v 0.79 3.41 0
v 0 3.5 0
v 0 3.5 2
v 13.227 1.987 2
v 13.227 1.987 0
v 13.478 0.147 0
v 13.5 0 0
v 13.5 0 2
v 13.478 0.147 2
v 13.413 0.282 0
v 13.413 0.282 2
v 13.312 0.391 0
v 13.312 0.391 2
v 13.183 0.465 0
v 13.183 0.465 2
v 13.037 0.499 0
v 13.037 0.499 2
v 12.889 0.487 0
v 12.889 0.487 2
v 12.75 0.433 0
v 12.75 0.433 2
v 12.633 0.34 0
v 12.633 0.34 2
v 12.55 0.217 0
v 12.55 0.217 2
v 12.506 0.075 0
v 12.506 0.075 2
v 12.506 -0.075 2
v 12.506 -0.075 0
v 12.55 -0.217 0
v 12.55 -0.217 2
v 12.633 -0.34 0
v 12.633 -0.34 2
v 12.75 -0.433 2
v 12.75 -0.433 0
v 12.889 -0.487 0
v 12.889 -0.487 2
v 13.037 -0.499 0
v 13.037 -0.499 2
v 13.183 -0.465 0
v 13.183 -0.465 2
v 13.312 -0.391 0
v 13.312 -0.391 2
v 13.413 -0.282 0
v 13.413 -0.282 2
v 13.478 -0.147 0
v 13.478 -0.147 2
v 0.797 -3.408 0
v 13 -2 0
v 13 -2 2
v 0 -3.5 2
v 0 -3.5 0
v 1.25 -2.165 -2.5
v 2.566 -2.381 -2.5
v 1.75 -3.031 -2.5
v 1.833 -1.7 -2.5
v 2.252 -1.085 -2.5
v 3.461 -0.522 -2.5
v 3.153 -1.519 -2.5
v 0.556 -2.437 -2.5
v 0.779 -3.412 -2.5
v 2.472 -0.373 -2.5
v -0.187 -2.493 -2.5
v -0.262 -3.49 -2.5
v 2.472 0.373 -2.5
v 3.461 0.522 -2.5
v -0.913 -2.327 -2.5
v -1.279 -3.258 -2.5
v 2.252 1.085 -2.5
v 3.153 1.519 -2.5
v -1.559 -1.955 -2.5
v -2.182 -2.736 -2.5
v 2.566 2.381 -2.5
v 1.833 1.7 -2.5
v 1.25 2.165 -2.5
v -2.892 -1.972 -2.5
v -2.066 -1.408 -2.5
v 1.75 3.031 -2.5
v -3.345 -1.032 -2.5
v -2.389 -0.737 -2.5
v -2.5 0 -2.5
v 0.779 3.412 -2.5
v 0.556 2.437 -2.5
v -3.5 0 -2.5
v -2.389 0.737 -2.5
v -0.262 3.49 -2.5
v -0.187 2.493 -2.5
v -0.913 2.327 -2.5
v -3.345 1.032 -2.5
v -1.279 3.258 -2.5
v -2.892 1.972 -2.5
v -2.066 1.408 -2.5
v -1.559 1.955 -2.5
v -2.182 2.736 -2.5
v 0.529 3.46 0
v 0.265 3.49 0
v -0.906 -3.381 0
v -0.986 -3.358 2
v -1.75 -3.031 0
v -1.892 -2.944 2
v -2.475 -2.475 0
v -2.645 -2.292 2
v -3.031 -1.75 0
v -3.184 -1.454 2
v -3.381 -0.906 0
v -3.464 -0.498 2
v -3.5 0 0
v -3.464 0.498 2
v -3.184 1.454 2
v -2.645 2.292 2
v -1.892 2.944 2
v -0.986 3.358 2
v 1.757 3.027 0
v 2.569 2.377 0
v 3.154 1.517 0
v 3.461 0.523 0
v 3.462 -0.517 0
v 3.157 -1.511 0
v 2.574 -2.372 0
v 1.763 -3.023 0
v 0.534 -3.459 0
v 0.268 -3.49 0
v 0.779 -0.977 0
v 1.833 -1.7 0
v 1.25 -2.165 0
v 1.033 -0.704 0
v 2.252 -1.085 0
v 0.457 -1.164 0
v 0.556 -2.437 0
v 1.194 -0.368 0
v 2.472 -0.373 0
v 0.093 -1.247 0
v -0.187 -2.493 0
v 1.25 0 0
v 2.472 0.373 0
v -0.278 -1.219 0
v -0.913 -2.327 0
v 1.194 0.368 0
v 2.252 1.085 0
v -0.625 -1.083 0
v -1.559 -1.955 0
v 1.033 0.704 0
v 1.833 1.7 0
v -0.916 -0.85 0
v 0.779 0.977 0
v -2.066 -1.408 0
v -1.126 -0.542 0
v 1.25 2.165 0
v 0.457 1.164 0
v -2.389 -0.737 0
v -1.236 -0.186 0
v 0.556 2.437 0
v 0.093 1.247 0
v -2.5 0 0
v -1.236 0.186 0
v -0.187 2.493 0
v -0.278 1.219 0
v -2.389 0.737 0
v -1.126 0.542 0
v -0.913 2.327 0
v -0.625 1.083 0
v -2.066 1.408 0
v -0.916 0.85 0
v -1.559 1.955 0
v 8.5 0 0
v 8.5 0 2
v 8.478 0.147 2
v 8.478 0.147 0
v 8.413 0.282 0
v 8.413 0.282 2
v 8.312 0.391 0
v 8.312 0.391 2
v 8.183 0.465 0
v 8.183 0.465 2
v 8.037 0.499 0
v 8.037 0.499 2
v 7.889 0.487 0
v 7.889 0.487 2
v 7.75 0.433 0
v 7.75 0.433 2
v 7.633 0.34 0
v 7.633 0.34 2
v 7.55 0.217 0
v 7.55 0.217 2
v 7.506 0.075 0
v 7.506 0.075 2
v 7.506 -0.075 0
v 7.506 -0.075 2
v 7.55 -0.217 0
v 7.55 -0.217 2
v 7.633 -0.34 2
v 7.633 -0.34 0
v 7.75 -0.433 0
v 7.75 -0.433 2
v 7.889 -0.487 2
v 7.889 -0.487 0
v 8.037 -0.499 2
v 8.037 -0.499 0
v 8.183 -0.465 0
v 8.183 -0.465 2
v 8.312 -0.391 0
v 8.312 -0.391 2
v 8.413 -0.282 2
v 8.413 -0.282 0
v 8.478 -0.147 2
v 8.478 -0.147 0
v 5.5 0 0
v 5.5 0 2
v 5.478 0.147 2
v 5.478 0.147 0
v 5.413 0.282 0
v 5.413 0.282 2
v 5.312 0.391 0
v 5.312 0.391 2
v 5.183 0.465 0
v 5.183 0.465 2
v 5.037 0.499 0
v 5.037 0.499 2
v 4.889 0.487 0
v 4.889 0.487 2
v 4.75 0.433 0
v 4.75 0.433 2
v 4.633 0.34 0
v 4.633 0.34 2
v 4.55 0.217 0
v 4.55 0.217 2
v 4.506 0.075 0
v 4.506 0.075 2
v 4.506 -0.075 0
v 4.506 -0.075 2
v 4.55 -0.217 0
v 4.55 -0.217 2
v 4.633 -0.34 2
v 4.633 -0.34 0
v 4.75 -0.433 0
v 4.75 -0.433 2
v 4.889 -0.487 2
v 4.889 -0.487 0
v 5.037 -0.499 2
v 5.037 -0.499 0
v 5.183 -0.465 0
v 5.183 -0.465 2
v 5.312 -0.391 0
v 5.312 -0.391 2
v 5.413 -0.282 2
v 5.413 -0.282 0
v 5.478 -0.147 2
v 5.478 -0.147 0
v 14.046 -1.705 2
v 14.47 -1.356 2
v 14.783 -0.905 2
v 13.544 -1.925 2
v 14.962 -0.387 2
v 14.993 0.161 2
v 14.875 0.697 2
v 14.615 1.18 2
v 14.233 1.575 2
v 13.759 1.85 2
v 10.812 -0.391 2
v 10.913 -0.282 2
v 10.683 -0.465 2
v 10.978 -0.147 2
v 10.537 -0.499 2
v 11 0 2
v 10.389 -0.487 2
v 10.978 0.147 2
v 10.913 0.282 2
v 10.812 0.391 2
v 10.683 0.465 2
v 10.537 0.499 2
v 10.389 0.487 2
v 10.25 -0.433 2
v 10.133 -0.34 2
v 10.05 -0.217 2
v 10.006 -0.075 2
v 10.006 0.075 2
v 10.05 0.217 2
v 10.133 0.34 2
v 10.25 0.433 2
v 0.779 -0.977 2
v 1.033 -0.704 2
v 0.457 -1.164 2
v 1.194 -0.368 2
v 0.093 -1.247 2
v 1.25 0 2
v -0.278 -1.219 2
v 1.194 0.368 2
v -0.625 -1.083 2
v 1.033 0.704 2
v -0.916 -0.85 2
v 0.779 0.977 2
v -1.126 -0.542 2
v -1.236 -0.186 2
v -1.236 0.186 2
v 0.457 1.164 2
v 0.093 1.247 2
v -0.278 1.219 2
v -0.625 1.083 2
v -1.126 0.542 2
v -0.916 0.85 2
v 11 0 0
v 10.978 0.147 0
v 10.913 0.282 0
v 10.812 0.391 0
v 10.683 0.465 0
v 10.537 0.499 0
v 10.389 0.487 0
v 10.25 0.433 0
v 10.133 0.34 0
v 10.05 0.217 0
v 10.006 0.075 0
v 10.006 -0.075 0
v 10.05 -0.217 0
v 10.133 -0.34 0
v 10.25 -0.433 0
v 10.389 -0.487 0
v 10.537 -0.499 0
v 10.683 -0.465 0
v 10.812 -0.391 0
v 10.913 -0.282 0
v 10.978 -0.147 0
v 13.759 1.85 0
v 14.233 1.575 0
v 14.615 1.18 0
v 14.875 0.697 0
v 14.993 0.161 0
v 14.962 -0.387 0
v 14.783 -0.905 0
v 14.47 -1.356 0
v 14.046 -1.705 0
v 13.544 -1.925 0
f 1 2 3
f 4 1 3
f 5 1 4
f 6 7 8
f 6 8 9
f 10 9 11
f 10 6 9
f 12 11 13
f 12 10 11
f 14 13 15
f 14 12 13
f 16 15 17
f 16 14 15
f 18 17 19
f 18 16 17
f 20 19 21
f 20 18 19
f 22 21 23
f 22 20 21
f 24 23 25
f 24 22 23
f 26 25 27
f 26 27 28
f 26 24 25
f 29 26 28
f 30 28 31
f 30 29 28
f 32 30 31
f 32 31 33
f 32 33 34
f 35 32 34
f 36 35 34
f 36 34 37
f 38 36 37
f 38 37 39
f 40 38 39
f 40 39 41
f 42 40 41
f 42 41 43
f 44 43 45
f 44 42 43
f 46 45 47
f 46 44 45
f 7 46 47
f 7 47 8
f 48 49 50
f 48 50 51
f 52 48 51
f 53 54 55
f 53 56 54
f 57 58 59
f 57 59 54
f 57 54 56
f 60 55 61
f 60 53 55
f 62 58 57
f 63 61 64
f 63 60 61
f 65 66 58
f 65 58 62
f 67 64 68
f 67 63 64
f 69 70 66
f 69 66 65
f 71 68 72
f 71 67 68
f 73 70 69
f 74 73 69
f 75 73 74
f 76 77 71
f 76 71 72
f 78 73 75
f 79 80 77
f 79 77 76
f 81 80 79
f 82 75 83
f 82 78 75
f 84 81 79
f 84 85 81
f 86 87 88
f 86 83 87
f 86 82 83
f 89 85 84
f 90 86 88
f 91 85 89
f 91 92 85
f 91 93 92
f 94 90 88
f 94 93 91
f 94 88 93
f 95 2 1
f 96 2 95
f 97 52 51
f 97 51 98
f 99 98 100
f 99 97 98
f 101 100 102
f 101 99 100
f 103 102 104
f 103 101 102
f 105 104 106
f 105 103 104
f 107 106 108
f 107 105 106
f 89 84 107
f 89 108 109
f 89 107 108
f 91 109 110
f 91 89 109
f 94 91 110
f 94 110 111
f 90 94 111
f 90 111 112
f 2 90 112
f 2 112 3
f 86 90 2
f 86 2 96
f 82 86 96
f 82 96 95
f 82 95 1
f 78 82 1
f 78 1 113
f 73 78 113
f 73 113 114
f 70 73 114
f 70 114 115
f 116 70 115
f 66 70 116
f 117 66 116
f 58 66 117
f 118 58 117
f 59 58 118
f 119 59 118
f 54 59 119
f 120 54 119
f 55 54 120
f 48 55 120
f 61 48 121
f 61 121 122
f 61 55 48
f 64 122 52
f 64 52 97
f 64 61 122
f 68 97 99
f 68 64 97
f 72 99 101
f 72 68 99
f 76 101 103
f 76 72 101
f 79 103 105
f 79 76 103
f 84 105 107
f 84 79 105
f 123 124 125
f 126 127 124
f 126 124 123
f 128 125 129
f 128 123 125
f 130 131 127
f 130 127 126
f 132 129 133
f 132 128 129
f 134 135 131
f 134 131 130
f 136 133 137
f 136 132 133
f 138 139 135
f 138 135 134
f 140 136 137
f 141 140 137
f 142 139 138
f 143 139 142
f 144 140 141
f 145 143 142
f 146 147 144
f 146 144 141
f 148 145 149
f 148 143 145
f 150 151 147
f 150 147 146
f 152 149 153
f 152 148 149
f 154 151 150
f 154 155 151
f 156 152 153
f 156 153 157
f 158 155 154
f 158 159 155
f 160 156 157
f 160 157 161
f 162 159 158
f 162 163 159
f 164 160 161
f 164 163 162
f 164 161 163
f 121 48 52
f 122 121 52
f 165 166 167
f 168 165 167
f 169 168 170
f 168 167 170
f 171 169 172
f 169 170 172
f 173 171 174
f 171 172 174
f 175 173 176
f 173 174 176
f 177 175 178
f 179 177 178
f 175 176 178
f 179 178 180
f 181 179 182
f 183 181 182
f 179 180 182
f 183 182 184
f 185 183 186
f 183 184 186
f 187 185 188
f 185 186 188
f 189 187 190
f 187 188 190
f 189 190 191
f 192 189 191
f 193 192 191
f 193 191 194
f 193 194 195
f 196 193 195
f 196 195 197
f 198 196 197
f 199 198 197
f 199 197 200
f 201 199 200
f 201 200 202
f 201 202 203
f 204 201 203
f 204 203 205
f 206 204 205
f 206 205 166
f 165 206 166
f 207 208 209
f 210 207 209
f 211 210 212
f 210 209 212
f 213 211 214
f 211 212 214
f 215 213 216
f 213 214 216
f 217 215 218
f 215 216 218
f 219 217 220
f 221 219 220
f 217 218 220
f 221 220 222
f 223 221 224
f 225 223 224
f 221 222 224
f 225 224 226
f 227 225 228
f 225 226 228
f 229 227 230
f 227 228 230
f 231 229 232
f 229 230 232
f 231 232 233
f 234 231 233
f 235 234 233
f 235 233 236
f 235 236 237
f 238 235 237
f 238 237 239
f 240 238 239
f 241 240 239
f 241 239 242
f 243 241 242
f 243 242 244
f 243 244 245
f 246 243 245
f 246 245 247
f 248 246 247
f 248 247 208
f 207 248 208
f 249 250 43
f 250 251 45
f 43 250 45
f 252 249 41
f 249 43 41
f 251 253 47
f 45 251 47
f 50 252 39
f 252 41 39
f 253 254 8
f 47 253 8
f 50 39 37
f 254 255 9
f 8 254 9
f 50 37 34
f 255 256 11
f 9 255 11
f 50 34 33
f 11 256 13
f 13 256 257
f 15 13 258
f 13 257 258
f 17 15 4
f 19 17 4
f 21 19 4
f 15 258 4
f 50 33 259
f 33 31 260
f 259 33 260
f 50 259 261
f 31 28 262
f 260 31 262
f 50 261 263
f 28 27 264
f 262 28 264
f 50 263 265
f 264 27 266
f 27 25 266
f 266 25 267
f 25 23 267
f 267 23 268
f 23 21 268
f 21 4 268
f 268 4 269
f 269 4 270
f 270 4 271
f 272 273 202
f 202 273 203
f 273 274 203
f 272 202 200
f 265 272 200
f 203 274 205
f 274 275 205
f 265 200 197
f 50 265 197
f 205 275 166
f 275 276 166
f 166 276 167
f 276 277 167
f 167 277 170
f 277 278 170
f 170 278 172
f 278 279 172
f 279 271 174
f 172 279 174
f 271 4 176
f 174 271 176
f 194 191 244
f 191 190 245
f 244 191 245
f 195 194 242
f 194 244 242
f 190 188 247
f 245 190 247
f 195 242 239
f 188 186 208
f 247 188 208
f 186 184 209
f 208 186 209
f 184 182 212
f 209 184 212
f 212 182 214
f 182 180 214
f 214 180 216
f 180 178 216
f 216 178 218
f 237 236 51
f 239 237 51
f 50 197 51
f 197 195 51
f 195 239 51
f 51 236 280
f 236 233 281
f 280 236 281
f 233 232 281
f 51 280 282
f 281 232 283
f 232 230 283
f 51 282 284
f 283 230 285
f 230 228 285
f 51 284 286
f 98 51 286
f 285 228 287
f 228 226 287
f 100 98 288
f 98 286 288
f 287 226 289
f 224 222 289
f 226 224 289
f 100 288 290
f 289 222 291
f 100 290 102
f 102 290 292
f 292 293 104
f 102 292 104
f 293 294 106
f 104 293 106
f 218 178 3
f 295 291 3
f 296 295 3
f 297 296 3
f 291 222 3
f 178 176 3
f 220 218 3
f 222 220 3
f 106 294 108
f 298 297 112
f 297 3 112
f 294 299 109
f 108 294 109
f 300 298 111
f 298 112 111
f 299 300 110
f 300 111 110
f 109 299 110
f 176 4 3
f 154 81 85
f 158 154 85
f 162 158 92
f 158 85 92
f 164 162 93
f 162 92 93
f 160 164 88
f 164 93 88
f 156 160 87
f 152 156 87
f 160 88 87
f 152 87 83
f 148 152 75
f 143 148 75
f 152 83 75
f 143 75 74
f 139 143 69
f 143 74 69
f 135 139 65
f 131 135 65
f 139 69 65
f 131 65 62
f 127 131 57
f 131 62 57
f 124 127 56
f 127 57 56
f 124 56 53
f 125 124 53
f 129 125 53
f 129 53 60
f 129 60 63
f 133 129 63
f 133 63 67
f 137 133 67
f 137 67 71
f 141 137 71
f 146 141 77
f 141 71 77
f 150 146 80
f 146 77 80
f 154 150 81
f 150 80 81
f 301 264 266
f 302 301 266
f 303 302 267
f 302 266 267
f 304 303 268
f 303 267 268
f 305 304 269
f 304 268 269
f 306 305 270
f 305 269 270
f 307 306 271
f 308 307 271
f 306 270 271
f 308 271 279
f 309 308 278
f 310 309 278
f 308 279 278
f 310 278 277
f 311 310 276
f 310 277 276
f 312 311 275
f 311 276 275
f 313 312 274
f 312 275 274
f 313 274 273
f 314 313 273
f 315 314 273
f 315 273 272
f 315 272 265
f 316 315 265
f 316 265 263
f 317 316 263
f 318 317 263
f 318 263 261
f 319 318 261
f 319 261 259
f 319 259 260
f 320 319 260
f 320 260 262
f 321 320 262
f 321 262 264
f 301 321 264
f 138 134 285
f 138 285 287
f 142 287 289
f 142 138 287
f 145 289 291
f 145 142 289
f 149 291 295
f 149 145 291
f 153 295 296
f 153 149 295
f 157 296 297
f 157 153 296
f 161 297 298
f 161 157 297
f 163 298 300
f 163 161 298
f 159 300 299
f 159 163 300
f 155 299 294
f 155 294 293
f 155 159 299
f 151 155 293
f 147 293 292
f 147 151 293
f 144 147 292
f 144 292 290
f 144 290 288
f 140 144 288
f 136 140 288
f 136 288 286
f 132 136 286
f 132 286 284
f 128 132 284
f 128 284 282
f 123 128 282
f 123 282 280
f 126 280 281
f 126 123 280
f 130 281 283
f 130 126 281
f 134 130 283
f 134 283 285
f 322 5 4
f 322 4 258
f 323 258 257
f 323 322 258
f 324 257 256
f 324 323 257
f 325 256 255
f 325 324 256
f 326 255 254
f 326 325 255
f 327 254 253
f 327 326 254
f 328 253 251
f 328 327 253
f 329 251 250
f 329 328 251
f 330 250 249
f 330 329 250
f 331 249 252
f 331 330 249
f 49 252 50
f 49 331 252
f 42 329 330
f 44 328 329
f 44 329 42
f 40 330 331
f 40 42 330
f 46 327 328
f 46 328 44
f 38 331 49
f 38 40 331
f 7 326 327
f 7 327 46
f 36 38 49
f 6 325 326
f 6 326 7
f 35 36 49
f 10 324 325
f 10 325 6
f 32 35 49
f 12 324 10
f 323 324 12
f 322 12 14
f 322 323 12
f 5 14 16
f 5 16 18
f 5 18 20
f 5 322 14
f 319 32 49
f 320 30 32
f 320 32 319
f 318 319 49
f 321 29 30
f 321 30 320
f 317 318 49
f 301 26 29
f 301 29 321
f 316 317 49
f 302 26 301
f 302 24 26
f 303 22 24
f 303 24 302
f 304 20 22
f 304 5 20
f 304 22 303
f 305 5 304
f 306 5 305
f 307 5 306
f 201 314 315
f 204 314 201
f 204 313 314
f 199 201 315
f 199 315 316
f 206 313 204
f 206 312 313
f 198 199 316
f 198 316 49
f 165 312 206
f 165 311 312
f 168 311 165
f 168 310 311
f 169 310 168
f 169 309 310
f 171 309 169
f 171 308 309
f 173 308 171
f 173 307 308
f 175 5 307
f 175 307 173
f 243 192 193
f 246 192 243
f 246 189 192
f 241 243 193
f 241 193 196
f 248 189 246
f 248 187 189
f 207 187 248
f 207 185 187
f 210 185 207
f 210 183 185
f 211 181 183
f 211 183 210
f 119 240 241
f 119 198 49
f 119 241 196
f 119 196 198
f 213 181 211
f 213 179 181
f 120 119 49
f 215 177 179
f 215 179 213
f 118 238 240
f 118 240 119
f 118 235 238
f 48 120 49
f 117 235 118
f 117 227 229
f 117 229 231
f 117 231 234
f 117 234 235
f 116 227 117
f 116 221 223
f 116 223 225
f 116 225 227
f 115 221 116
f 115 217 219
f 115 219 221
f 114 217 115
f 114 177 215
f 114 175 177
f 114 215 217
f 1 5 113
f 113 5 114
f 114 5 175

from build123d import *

# Parameters (mm, degrees)
SKETCH_1_R          = 1.25
SKETCH_1_R_2        = 0.5
EXTRUDE_1_DEPTH     = 2
CUT_EXTRUDE_1_REACH = 17.532
SKETCH_2_R          = 0.5
EXTRUDE_START       = 2.5
SKETCH_3_R          = 3.5
SKETCH_3_R_2        = 2.5
EXTRUDE_2_DEPTH     = 2.5


with BuildPart() as part:
    # 草圖1 → 填料-伸長1 (new body)
    with BuildSketch(Plane.XY):
        with BuildLine():
            Line((0, 3.5), (13.227281041, 1.987043867))
            ThreePointArc((13.227281041, 1.987043867), (14.99675834, -0.113825012), (13, -2))
            Line((13, -2), (0, -3.5))
            ThreePointArc((0, -3.5), (-3.5, 0), (0, 3.5))
        make_face()
        Circle(SKETCH_1_R, mode=Mode.SUBTRACT)
        with Locations((13, 0)):
            Circle(SKETCH_1_R_2, mode=Mode.SUBTRACT)
    extrude(amount=EXTRUDE_1_DEPTH)

    # 草圖2 → 除料-伸長1 (cut, up to next)
    with BuildSketch(Plane.XY.offset(2), mode=Mode.PRIVATE) as cut_extrude_1_sk1:
        with Locations((10.5, 0)):
            Circle(SKETCH_2_R)
    cut_extrude_1_tool1 = extrude(cut_extrude_1_sk1.sketch, amount=-CUT_EXTRUDE_1_REACH, mode=Mode.PRIVATE) & part.part
    # 草圖2 → 除料-伸長1 (cut, up to next)
    with BuildSketch(Plane.XY.offset(2), mode=Mode.PRIVATE) as cut_extrude_1_sk2:
        with Locations((8, 0)):
            Circle(SKETCH_2_R)
    cut_extrude_1_tool2 = extrude(cut_extrude_1_sk2.sketch, amount=-CUT_EXTRUDE_1_REACH, mode=Mode.PRIVATE) & part.part
    # 草圖2 → 除料-伸長1 (cut, up to next)
    with BuildSketch(Plane.XY.offset(2), mode=Mode.PRIVATE) as cut_extrude_1_sk3:
        with Locations((5, 0)):
            Circle(SKETCH_2_R)
    cut_extrude_1_tool3 = extrude(cut_extrude_1_sk3.sketch, amount=-CUT_EXTRUDE_1_REACH, mode=Mode.PRIVATE) & part.part
    add(cut_extrude_1_tool1.solids().sort_by_distance((10.5, 0, 2))[0], mode=Mode.SUBTRACT)
    add(cut_extrude_1_tool2.solids().sort_by_distance((8, 0, 2))[0], mode=Mode.SUBTRACT)
    add(cut_extrude_1_tool3.solids().sort_by_distance((5, 0, 2))[0], mode=Mode.SUBTRACT)

    # 草圖3 → 填料-伸長2 (add)
    with BuildSketch(Plane(origin=(0, 0, 0), x_dir=(-1, 0, 0), z_dir=(0, 0, -1)).offset(EXTRUDE_START)):
        Circle(SKETCH_3_R)
        Circle(SKETCH_3_R_2, mode=Mode.SUBTRACT)
    extrude(amount=-EXTRUDE_2_DEPTH)


solid = part.part
